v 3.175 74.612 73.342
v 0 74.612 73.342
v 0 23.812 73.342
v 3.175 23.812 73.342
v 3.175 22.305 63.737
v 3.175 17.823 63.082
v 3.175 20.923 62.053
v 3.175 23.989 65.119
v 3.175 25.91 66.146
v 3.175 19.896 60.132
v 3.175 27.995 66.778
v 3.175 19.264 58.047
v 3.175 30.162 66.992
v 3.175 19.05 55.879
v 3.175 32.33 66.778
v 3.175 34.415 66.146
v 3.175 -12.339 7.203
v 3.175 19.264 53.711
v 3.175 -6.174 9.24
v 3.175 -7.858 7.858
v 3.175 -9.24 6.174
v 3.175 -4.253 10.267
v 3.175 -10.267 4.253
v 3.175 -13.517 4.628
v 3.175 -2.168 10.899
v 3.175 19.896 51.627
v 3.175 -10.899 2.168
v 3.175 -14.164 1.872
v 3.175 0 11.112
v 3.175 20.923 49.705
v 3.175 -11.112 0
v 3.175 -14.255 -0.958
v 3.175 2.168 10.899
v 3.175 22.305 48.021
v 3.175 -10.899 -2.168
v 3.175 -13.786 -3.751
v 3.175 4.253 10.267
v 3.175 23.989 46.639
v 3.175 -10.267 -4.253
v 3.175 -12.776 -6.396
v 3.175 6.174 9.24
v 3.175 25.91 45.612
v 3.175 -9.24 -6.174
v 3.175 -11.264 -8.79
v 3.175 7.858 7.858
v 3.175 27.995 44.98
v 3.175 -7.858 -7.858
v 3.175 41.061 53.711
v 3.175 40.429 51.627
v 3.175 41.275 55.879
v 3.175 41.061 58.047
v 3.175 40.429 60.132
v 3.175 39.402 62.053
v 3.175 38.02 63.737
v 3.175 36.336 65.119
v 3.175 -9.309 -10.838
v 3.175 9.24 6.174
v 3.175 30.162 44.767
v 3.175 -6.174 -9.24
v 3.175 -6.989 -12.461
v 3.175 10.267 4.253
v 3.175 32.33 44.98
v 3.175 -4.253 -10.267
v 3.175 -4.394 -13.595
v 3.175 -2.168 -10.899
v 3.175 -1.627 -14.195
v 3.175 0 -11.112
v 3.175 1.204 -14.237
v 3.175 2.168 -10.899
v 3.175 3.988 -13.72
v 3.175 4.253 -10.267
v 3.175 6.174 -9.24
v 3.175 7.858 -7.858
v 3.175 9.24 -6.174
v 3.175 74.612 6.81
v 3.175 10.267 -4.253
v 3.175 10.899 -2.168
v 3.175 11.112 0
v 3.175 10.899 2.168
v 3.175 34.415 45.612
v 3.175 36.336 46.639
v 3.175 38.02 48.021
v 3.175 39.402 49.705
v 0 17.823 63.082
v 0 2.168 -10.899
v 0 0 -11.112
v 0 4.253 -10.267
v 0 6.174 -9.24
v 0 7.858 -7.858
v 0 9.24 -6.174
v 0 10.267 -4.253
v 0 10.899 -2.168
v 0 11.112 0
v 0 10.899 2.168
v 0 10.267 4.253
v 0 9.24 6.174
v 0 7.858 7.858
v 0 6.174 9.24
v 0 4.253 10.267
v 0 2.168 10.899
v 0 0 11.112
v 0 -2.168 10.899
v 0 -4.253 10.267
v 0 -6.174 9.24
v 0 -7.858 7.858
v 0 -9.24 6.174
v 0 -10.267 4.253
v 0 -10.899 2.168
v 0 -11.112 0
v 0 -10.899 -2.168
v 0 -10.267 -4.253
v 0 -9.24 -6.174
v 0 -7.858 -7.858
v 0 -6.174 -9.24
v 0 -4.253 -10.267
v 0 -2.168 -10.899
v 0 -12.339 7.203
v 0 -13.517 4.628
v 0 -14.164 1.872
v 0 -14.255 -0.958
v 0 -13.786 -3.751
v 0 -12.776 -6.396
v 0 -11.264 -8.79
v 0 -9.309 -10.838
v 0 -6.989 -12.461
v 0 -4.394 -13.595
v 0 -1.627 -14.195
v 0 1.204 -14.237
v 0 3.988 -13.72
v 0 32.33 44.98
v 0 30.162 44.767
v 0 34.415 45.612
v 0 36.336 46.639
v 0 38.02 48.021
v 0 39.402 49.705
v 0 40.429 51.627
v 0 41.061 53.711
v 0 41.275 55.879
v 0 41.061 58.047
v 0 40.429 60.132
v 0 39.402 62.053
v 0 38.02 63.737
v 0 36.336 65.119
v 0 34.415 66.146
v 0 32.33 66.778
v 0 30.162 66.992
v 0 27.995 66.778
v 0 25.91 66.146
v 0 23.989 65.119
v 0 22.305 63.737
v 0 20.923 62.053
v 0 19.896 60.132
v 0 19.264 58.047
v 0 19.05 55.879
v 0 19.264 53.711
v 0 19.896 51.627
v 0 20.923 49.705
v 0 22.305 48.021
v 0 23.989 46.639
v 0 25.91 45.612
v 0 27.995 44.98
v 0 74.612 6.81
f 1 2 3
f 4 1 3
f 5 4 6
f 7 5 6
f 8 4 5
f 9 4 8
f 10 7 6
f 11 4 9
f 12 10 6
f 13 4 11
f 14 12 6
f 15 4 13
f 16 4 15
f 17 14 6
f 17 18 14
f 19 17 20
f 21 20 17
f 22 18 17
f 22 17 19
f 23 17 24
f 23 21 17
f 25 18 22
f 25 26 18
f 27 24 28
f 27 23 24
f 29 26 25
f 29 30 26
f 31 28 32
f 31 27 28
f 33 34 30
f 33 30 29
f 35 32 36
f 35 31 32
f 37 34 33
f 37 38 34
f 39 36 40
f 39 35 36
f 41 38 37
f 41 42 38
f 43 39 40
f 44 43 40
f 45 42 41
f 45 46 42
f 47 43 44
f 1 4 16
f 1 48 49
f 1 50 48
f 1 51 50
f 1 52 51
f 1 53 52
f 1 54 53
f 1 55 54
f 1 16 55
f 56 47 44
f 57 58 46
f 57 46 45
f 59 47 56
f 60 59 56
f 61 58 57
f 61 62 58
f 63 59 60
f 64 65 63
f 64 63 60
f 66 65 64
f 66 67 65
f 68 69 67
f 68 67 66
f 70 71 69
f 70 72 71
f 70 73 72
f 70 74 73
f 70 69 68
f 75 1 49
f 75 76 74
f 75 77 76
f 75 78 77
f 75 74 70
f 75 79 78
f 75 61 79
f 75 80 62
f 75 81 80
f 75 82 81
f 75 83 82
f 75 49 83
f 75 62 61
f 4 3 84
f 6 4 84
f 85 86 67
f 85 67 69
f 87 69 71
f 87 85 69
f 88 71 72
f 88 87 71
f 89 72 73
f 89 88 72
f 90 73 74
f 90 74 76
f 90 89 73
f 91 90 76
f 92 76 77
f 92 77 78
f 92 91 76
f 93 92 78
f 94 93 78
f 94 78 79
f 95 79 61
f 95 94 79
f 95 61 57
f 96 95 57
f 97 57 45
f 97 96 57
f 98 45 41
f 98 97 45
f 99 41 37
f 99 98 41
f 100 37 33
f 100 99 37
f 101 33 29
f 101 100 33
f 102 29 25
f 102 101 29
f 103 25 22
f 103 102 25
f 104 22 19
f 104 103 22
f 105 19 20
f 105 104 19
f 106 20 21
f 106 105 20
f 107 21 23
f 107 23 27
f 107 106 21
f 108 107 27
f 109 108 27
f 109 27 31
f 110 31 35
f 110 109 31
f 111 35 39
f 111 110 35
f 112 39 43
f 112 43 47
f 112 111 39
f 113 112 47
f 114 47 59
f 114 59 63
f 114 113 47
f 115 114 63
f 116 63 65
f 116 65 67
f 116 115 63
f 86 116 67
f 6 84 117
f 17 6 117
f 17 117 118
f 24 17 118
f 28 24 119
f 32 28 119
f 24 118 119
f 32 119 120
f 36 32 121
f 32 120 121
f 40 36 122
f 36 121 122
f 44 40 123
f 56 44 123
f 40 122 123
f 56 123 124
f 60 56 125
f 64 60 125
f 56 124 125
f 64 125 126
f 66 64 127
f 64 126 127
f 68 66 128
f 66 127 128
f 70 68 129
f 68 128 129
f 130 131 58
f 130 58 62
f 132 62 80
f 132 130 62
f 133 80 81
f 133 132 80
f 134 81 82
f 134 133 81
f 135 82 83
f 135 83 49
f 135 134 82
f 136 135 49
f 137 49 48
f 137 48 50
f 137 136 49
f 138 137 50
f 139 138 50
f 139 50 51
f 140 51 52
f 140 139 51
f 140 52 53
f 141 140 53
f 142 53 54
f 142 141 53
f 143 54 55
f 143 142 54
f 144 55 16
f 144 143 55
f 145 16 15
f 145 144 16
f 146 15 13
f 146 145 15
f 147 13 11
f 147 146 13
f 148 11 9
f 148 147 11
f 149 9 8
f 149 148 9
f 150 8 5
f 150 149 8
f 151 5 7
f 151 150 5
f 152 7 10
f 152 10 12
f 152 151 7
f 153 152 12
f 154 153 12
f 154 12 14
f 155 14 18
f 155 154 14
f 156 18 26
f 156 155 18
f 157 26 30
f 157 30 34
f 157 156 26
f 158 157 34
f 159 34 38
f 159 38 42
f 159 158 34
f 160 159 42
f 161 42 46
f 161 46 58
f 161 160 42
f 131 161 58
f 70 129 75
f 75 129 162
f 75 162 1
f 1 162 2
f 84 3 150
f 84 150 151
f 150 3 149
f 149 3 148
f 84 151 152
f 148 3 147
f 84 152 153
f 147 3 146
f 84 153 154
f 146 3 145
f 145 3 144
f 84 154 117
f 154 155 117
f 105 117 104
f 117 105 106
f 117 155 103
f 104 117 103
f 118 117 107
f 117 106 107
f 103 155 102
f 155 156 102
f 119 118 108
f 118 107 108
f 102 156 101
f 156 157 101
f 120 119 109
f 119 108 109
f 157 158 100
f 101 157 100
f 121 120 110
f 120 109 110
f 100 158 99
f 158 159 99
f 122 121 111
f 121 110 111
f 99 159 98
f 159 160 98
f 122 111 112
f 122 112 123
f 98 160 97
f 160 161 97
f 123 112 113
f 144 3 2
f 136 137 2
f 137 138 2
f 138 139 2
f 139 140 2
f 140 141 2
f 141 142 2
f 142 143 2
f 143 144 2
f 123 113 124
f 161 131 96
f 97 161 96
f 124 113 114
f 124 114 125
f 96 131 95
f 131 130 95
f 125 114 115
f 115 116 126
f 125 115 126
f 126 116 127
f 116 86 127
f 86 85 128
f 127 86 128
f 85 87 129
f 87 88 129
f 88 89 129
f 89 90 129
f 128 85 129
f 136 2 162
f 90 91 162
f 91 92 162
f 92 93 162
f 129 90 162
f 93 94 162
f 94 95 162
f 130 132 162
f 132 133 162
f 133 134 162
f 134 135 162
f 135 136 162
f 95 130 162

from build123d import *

# Parameters (mm, degrees)
SKETCH2_R           = 11.1125
BOSS_EXTRUDE1_DEPTH = 3.175


with BuildPart() as part:
    # Sketch2 → Boss-Extrude1 (new body)
    with BuildSketch(Plane(origin=(0, 0, 0), x_dir=(0, 0, -1), z_dir=(1, 0, 0))):
        with BuildLine():
            Line((13.719623131, 3.988056845), (-6.809679404, 74.6125))
            Line((-6.809679404, 74.6125), (-73.341598004, 74.6125))
            Line((-73.341598004, 74.6125), (-73.341598004, 23.8125))
            Line((-73.341598004, 23.8125), (-63.081952462, 17.823474758))
            Line((-63.081952462, 17.823474758), (-7.202854458, -12.339025242))
            ThreePointArc((-7.202854458, -12.339025242), (8.789793561, -11.263755386), (13.719623131, 3.988056845))
        make_face()
        with Locations((-55.879098004, 30.1625)):
            Circle(SKETCH2_R, mode=Mode.SUBTRACT)
        Circle(SKETCH2_R, mode=Mode.SUBTRACT)
    extrude(amount=BOSS_EXTRUDE1_DEPTH)


solid = part.part
